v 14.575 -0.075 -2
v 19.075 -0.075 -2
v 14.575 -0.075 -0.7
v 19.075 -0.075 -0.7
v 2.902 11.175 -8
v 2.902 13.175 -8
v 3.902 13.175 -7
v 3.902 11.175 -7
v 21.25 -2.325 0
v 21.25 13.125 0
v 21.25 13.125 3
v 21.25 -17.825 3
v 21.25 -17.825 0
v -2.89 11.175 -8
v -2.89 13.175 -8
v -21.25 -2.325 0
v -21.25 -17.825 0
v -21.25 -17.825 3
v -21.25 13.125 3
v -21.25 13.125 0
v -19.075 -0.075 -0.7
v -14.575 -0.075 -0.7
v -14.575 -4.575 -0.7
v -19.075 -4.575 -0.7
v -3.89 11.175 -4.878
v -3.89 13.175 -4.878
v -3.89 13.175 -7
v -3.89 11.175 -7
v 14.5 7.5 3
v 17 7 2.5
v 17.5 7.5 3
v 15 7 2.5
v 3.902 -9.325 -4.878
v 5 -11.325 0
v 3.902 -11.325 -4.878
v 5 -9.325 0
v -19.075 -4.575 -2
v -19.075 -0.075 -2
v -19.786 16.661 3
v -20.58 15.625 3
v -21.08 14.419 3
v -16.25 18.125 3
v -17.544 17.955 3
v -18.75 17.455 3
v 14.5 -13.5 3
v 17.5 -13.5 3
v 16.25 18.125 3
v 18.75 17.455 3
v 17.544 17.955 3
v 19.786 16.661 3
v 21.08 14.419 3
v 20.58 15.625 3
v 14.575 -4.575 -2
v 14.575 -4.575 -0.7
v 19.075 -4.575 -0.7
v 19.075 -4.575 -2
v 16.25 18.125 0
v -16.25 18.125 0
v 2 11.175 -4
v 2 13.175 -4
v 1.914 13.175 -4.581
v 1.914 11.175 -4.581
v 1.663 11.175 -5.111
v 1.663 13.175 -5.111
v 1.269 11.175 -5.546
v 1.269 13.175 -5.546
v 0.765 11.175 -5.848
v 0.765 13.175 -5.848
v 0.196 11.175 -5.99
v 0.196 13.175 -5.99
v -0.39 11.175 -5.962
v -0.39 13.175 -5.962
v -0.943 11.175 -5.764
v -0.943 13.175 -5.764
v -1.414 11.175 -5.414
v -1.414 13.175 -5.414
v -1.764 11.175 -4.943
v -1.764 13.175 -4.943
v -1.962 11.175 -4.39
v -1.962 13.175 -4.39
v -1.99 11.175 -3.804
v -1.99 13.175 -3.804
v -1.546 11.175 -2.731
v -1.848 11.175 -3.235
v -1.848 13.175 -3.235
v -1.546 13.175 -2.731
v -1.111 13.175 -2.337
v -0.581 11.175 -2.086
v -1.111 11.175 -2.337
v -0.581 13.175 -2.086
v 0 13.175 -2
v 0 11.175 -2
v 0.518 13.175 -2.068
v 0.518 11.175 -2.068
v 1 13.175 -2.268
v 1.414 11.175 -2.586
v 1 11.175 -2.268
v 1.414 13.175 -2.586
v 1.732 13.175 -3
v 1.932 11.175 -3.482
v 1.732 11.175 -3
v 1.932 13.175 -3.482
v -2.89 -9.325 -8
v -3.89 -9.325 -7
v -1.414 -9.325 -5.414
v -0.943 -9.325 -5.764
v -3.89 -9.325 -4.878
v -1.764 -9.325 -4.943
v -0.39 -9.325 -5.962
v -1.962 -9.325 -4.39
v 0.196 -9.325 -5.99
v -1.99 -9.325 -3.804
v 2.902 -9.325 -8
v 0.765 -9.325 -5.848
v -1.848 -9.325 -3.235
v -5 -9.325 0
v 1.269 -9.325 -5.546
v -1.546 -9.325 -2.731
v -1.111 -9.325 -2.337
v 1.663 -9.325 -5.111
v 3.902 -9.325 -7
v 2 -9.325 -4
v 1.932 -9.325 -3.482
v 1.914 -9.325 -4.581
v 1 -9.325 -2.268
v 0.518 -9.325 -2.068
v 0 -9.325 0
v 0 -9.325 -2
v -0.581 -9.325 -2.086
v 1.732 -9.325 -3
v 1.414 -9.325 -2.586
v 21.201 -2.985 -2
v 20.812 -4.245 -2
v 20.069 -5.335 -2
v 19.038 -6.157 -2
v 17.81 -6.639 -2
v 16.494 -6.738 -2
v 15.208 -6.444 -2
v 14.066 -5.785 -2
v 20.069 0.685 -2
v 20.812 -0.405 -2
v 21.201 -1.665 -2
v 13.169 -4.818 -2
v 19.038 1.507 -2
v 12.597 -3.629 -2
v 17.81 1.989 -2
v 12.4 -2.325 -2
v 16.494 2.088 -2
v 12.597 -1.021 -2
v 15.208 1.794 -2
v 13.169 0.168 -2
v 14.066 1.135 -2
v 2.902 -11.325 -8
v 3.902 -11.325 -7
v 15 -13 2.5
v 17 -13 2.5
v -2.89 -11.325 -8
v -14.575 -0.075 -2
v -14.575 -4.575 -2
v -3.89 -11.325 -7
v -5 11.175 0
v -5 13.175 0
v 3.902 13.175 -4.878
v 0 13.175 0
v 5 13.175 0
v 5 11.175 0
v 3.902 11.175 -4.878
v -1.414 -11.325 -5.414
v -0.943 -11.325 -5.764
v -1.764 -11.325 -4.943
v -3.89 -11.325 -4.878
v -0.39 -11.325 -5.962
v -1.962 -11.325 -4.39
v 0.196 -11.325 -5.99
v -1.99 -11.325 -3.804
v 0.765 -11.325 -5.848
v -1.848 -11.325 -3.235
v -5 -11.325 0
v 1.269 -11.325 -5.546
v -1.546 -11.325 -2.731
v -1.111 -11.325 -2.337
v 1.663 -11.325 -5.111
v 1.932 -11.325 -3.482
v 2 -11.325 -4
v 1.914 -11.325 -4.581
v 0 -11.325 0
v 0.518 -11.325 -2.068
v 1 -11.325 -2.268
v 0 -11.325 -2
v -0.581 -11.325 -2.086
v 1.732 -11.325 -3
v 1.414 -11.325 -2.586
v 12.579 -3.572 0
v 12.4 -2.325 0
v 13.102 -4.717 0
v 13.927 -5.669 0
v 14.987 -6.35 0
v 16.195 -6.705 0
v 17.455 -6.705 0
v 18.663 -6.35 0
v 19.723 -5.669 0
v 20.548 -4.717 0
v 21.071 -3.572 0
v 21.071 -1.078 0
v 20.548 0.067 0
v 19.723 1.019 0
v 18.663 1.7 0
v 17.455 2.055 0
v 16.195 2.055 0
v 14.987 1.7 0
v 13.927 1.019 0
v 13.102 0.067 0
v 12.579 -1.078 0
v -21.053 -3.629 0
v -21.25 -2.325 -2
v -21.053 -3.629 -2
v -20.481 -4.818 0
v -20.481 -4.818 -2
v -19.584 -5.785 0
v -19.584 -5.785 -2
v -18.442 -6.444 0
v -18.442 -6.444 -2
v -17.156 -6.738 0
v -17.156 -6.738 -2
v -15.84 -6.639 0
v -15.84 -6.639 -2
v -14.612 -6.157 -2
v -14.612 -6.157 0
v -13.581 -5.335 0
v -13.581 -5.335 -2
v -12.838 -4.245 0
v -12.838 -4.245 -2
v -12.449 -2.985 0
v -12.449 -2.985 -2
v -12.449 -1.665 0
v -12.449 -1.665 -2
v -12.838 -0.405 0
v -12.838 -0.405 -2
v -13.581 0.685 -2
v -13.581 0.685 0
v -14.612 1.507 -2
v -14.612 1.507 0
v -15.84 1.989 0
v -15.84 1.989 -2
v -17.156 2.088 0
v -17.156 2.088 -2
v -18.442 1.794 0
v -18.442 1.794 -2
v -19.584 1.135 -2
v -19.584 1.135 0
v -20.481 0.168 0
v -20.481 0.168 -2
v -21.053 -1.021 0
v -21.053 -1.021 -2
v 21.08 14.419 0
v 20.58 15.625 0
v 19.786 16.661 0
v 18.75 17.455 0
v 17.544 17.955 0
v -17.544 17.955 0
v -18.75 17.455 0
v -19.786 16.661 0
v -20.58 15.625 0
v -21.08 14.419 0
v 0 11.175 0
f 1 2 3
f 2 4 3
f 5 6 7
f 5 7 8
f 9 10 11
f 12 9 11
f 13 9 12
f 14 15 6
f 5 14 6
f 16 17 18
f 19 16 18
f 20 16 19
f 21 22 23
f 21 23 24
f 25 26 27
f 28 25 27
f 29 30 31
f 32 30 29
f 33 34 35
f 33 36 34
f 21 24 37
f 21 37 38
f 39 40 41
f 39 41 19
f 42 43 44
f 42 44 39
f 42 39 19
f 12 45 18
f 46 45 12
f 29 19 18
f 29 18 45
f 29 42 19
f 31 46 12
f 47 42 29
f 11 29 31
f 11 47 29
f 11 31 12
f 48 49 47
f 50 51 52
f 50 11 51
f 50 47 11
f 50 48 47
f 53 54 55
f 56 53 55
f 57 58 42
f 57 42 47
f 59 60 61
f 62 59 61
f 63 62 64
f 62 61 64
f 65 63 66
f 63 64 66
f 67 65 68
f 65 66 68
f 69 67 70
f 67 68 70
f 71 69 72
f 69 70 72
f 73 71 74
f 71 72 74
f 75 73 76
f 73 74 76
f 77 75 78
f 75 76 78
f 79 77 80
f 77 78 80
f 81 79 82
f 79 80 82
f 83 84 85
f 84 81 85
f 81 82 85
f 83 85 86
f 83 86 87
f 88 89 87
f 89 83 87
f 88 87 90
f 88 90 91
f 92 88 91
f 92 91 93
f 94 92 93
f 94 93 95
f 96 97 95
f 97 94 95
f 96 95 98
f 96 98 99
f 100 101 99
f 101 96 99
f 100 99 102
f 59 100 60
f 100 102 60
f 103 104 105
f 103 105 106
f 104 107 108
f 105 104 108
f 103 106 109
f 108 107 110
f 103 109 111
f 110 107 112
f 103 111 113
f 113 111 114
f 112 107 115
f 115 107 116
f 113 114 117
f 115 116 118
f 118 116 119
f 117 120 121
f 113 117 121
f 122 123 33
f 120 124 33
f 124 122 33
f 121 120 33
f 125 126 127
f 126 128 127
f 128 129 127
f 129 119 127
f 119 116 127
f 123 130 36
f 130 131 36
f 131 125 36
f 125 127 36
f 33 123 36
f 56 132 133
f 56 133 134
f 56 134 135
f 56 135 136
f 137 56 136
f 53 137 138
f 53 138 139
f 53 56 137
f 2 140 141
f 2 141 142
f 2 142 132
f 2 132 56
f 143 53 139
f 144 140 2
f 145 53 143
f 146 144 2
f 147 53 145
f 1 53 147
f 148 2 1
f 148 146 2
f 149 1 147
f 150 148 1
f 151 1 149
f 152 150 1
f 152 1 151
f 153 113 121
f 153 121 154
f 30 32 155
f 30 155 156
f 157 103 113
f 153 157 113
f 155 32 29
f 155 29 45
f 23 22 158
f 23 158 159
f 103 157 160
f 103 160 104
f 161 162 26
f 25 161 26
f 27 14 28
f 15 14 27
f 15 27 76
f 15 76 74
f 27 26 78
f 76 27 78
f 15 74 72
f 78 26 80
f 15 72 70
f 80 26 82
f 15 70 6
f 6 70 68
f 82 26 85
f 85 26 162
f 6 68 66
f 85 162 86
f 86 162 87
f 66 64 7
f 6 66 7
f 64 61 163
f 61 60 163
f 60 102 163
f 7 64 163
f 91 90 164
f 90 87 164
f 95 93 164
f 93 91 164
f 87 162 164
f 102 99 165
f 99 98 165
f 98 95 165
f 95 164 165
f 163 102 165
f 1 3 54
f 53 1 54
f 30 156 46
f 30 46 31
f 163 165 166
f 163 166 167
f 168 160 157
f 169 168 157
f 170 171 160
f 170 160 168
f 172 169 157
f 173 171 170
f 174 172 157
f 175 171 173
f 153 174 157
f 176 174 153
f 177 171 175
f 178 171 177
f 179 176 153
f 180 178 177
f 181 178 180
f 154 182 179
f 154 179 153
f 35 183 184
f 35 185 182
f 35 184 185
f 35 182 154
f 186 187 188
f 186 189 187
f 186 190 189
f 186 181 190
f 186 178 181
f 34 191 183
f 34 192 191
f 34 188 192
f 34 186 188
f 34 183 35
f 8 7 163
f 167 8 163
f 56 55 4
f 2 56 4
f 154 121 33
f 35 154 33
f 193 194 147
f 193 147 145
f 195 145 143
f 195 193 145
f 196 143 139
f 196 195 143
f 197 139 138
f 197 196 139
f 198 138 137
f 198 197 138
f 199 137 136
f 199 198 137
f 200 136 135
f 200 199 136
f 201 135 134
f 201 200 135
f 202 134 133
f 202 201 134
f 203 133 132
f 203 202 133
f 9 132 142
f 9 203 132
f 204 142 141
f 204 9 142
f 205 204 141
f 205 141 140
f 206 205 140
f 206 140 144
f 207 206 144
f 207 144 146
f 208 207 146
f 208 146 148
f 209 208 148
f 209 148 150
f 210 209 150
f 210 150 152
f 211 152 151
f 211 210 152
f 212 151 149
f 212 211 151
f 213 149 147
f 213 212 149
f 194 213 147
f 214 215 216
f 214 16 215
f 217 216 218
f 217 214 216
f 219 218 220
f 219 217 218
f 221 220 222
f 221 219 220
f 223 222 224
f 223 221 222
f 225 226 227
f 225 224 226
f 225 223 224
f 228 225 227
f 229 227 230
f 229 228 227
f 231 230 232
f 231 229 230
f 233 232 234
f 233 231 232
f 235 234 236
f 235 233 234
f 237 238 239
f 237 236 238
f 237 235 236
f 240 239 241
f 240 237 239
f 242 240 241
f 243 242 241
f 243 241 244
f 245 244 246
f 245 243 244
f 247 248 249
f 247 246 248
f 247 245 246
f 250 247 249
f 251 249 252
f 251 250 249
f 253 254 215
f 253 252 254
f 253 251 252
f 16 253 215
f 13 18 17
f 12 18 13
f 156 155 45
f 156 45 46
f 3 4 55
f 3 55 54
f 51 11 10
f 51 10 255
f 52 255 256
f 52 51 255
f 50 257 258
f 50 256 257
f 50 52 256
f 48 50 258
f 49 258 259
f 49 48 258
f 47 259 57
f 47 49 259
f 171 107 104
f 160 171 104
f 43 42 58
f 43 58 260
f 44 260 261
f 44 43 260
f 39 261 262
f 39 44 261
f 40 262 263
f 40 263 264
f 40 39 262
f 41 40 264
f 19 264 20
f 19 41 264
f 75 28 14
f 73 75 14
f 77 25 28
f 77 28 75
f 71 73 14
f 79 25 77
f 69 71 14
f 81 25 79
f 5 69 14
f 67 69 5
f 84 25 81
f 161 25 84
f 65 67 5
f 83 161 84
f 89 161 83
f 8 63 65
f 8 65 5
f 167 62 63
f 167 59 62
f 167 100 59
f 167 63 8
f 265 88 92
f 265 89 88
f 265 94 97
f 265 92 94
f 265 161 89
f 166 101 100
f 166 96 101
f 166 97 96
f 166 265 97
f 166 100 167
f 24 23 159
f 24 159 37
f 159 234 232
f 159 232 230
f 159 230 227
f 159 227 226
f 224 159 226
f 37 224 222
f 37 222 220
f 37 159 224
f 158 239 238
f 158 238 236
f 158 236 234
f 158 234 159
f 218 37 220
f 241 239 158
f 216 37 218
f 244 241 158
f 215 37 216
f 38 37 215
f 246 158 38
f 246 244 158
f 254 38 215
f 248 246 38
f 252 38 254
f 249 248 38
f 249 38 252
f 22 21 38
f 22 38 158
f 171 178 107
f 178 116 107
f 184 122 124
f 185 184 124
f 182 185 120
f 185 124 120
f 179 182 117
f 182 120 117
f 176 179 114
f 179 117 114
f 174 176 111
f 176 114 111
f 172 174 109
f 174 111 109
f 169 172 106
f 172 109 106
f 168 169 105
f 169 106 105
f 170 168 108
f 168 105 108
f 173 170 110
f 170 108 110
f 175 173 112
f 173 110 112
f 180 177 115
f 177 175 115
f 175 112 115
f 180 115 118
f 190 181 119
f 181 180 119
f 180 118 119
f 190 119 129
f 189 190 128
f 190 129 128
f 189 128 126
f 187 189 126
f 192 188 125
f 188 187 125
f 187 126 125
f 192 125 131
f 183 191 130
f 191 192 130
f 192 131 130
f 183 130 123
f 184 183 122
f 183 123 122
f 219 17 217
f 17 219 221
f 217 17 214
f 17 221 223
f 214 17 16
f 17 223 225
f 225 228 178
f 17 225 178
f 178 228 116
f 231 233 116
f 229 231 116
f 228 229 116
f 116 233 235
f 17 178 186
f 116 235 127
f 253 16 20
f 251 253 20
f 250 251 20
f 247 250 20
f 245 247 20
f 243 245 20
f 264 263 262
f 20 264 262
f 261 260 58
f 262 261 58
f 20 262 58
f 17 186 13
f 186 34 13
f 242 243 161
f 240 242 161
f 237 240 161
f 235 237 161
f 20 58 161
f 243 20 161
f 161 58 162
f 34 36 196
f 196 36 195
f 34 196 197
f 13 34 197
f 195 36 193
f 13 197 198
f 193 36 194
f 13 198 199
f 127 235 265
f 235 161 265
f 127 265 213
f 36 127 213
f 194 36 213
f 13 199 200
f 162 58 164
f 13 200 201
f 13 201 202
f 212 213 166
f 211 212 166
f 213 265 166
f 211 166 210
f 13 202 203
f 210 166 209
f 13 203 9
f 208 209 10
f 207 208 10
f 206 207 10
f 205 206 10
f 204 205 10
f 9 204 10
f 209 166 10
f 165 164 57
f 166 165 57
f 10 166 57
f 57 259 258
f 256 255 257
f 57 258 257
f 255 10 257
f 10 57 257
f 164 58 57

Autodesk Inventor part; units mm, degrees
ref_plane "YZ Plane" through (0, 0, 0) normal (1, 0, 0) x (0, 1, 0)
ref_plane "XZ Plane" through (0, 0, 0) normal (0, 1, 0) x (-1, 0, 0)
sketch "스케치1" plane through (0, 0, 0) normal (0, 0, 1) x (1, 0, 0)
  line L0 (-21.25, 18.125) -> (21.25, 18.125)
  line L1 (21.25, 18.125) -> (21.25, -18.125)
  line L2 (21.25, -18.125) -> (-21.25, -18.125)
  line L3 (-21.25, -18.125) -> (-21.25, 18.125)
  line L4 (-21.25, 18.125) -> (21.25, -18.125) construction
  line L5 (21.25, 18.125) -> (-21.25, -18.125) construction
  point P0 (0, 0)
  dimension "d0" = 42.5
  dimension "d1" = 36.25
extrude "돌출1" add sketch "스케치1" along normal blind 3
fillet "모깎기1" radius 5 2 edges at (21.25, 18.125, 1.5) (-21.25, 18.125, 1.5)
ref_plane "작업 평면1" through (-21.25, -9.325, 0) normal (0, -1, 0) x (1, 0, 0)
sketch "스케치2" plane through (-21.25, -9.325, 0) normal (0, -1, 0) x (1, 0, 0)
  line L0 (21.25, 0) -> (21.25, -4)
  circle A0 centre (21.25, -4) radius 2
  circle A1 centre (21.25, -4) radius 4
  line L1 (21.25, 0) -> (26.25, 0)
  line L2 (0, 0) -> (42.5, 0) construction
  line L3 (26.25, 0) -> (25.1524, -4.878)
  line L4 (21.25, 0) -> (16.25, 0)
  line L5 (16.25, 0) -> (17.4292, -5.184)
  dimension "d6" = 4
  dimension "d7" = 4
  dimension "d8" = 8
  dimension "d9" = 10
extrude "돌출2" add sketch "스케치2" along normal blind 2 contours L1 L3 A1 | A1 L5 | A1 L5 L4 picked at (20.9261, -0.7066)
pattern_linear "직사각형 패턴1" count 2 spacing 22.5 along (0, 1, 0) of "돌출2"
sketch "스케치3" plane through (0, 0, 0) normal (0, 0, -1) x (-1, 0, 0)
  circle A0 centre (16.825, -2.325) radius 4.425
  line L0 (21.25, -18.125) -> (-21.25, -18.125) projected
  line L1 (0, 0) -> (0, 4.3779)
  circle A1 centre (-16.825, -2.325) radius 4.425
  line L2 (21.25, 13.125) -> (21.25, -18.125) projected
  line L3 (-19.075, -0.075) -> (-14.575, -0.075)
  line L4 (-14.575, -0.075) -> (-14.575, -4.575)
  line L5 (-14.575, -4.575) -> (-19.075, -4.575)
  line L6 (-19.075, -4.575) -> (-19.075, -0.075)
  line L7 (-19.075, -0.075) -> (-14.575, -4.575) construction
  line L8 (-14.575, -0.075) -> (-19.075, -4.575) construction
  line L9 (14.575, -4.575) -> (19.075, -4.575)
  line L10 (19.075, -4.575) -> (19.075, -0.075)
  line L11 (19.075, -0.075) -> (14.575, -0.075)
  line L12 (14.575, -0.075) -> (14.575, -4.575)
  line L13 (14.575, -4.575) -> (19.075, -0.075) construction
  line L14 (19.075, -4.575) -> (14.575, -0.075) construction
  dimension "d16" = 15.8
  dimension "d17" = 33.65
  dimension "d18" = 4.5
  dimension "d19" = 4.5
  dimension "d20" = 4.5
  dimension "d21" = 4.5
extrude "돌출3" add sketch "스케치3" along normal blind 2
sketch "스케치4" plane through (0, 0, 3) normal (0, 0, 1) x (1, 0, 0)
  line L0 (-21.25, -18.125) -> (21.25, -18.125) projected
  line L1 (21.25, -18.125) -> (21.25, 13.125) projected
  line L2 (-21.25, 13.125) -> (-21.25, -18.125) projected
  line L3 (-21.25, -17.825) -> (21.25, -17.825)
  point P0 (0, 0)
  dimension "d24" = 0.3
extrude "돌출4" cut sketch "스케치4" against normal blind 3
sketch "스케치5" plane through (0, 0, 3) normal (0, 0, 1) x (1, 0, 0)
  line L0 (15, 7) -> (17, 7)
  line L1 (17, 7) -> (17, -13)
  line L2 (17, -13) -> (15, -13)
  line L3 (15, -13) -> (15, 7)
  line L4 (15, 7) -> (17, -13) construction
  line L5 (17, 7) -> (15, -13) construction
  point P0 (0, 0)
  point P1 (16, -3)
  dimension "d27" = 2
  dimension "d28" = 20
  dimension "d32" = 3
  dimension "d33" = 16
extrude "돌출5" cut sketch "스케치5" against normal blind 0.5
chamfer "모따기1" distance 0.5 angle 45 4 edges at (15, -3, 3) (16, 7, 3) (17, -3, 3) (16, -13, 3)
sketch "스케치6" plane through (0, 0, 0) normal (0, 0, -1) x (-1, 0, 0)
  line L0 (-19.075, -0.075) -> (-19.075, -4.575) projected
  line L1 (-19.075, -4.575) -> (-14.575, -4.575) projected
  line L2 (-14.575, -4.575) -> (-14.575, -0.075) projected
  line L3 (-14.575, -0.075) -> (-19.075, -0.075) projected
  line L4 (14.575, -4.575) -> (19.075, -4.575) projected
  line L5 (19.075, -4.575) -> (19.075, -0.075) projected
  line L6 (19.075, -0.075) -> (14.575, -0.075) projected
  line L7 (14.575, -0.075) -> (14.575, -4.575) projected
  point P0 (0, 0)
extrude "돌출6" add sketch "스케치6" along normal blind 0.7
sketch "스케치9" plane through (-21.25, -9.325, 0) normal (0, 1, 0) x (1, 0, 0)
  arc A0 (25.1524, 4.878) -> (17.4292, 5.184) centre (21.25, 4) ccw projected
  line L0 (25.1524, 4.878) -> (17.3596, 4.878)
  line L1 (17.3596, 4.878) -> (17.3596, 8)
  line L2 (17.3596, 8) -> (25.1524, 8)
  line L3 (25.1524, 8) -> (25.1524, 4.878)
  line L4 (16.25, 0) -> (17.4292, 5.184) projected
  point P0 (21.25, 0)
  point P1 (21.25, 8)
extrude "돌출9" add sketch "스케치9" against normal blind 2 contours A0 L2 L3 | A0 L4 L1 L2
chamfer "모따기3" distance 1 angle 45 2 edges at (3.9024, -10.325, -8) (-3.8904, -10.325, -8)
pattern_linear "직사각형 패턴2" count 2 spacing 22.5 along (0, 1, 0) of "돌출9", "모따기3"
properties part number "버튼 스위치 상단"
